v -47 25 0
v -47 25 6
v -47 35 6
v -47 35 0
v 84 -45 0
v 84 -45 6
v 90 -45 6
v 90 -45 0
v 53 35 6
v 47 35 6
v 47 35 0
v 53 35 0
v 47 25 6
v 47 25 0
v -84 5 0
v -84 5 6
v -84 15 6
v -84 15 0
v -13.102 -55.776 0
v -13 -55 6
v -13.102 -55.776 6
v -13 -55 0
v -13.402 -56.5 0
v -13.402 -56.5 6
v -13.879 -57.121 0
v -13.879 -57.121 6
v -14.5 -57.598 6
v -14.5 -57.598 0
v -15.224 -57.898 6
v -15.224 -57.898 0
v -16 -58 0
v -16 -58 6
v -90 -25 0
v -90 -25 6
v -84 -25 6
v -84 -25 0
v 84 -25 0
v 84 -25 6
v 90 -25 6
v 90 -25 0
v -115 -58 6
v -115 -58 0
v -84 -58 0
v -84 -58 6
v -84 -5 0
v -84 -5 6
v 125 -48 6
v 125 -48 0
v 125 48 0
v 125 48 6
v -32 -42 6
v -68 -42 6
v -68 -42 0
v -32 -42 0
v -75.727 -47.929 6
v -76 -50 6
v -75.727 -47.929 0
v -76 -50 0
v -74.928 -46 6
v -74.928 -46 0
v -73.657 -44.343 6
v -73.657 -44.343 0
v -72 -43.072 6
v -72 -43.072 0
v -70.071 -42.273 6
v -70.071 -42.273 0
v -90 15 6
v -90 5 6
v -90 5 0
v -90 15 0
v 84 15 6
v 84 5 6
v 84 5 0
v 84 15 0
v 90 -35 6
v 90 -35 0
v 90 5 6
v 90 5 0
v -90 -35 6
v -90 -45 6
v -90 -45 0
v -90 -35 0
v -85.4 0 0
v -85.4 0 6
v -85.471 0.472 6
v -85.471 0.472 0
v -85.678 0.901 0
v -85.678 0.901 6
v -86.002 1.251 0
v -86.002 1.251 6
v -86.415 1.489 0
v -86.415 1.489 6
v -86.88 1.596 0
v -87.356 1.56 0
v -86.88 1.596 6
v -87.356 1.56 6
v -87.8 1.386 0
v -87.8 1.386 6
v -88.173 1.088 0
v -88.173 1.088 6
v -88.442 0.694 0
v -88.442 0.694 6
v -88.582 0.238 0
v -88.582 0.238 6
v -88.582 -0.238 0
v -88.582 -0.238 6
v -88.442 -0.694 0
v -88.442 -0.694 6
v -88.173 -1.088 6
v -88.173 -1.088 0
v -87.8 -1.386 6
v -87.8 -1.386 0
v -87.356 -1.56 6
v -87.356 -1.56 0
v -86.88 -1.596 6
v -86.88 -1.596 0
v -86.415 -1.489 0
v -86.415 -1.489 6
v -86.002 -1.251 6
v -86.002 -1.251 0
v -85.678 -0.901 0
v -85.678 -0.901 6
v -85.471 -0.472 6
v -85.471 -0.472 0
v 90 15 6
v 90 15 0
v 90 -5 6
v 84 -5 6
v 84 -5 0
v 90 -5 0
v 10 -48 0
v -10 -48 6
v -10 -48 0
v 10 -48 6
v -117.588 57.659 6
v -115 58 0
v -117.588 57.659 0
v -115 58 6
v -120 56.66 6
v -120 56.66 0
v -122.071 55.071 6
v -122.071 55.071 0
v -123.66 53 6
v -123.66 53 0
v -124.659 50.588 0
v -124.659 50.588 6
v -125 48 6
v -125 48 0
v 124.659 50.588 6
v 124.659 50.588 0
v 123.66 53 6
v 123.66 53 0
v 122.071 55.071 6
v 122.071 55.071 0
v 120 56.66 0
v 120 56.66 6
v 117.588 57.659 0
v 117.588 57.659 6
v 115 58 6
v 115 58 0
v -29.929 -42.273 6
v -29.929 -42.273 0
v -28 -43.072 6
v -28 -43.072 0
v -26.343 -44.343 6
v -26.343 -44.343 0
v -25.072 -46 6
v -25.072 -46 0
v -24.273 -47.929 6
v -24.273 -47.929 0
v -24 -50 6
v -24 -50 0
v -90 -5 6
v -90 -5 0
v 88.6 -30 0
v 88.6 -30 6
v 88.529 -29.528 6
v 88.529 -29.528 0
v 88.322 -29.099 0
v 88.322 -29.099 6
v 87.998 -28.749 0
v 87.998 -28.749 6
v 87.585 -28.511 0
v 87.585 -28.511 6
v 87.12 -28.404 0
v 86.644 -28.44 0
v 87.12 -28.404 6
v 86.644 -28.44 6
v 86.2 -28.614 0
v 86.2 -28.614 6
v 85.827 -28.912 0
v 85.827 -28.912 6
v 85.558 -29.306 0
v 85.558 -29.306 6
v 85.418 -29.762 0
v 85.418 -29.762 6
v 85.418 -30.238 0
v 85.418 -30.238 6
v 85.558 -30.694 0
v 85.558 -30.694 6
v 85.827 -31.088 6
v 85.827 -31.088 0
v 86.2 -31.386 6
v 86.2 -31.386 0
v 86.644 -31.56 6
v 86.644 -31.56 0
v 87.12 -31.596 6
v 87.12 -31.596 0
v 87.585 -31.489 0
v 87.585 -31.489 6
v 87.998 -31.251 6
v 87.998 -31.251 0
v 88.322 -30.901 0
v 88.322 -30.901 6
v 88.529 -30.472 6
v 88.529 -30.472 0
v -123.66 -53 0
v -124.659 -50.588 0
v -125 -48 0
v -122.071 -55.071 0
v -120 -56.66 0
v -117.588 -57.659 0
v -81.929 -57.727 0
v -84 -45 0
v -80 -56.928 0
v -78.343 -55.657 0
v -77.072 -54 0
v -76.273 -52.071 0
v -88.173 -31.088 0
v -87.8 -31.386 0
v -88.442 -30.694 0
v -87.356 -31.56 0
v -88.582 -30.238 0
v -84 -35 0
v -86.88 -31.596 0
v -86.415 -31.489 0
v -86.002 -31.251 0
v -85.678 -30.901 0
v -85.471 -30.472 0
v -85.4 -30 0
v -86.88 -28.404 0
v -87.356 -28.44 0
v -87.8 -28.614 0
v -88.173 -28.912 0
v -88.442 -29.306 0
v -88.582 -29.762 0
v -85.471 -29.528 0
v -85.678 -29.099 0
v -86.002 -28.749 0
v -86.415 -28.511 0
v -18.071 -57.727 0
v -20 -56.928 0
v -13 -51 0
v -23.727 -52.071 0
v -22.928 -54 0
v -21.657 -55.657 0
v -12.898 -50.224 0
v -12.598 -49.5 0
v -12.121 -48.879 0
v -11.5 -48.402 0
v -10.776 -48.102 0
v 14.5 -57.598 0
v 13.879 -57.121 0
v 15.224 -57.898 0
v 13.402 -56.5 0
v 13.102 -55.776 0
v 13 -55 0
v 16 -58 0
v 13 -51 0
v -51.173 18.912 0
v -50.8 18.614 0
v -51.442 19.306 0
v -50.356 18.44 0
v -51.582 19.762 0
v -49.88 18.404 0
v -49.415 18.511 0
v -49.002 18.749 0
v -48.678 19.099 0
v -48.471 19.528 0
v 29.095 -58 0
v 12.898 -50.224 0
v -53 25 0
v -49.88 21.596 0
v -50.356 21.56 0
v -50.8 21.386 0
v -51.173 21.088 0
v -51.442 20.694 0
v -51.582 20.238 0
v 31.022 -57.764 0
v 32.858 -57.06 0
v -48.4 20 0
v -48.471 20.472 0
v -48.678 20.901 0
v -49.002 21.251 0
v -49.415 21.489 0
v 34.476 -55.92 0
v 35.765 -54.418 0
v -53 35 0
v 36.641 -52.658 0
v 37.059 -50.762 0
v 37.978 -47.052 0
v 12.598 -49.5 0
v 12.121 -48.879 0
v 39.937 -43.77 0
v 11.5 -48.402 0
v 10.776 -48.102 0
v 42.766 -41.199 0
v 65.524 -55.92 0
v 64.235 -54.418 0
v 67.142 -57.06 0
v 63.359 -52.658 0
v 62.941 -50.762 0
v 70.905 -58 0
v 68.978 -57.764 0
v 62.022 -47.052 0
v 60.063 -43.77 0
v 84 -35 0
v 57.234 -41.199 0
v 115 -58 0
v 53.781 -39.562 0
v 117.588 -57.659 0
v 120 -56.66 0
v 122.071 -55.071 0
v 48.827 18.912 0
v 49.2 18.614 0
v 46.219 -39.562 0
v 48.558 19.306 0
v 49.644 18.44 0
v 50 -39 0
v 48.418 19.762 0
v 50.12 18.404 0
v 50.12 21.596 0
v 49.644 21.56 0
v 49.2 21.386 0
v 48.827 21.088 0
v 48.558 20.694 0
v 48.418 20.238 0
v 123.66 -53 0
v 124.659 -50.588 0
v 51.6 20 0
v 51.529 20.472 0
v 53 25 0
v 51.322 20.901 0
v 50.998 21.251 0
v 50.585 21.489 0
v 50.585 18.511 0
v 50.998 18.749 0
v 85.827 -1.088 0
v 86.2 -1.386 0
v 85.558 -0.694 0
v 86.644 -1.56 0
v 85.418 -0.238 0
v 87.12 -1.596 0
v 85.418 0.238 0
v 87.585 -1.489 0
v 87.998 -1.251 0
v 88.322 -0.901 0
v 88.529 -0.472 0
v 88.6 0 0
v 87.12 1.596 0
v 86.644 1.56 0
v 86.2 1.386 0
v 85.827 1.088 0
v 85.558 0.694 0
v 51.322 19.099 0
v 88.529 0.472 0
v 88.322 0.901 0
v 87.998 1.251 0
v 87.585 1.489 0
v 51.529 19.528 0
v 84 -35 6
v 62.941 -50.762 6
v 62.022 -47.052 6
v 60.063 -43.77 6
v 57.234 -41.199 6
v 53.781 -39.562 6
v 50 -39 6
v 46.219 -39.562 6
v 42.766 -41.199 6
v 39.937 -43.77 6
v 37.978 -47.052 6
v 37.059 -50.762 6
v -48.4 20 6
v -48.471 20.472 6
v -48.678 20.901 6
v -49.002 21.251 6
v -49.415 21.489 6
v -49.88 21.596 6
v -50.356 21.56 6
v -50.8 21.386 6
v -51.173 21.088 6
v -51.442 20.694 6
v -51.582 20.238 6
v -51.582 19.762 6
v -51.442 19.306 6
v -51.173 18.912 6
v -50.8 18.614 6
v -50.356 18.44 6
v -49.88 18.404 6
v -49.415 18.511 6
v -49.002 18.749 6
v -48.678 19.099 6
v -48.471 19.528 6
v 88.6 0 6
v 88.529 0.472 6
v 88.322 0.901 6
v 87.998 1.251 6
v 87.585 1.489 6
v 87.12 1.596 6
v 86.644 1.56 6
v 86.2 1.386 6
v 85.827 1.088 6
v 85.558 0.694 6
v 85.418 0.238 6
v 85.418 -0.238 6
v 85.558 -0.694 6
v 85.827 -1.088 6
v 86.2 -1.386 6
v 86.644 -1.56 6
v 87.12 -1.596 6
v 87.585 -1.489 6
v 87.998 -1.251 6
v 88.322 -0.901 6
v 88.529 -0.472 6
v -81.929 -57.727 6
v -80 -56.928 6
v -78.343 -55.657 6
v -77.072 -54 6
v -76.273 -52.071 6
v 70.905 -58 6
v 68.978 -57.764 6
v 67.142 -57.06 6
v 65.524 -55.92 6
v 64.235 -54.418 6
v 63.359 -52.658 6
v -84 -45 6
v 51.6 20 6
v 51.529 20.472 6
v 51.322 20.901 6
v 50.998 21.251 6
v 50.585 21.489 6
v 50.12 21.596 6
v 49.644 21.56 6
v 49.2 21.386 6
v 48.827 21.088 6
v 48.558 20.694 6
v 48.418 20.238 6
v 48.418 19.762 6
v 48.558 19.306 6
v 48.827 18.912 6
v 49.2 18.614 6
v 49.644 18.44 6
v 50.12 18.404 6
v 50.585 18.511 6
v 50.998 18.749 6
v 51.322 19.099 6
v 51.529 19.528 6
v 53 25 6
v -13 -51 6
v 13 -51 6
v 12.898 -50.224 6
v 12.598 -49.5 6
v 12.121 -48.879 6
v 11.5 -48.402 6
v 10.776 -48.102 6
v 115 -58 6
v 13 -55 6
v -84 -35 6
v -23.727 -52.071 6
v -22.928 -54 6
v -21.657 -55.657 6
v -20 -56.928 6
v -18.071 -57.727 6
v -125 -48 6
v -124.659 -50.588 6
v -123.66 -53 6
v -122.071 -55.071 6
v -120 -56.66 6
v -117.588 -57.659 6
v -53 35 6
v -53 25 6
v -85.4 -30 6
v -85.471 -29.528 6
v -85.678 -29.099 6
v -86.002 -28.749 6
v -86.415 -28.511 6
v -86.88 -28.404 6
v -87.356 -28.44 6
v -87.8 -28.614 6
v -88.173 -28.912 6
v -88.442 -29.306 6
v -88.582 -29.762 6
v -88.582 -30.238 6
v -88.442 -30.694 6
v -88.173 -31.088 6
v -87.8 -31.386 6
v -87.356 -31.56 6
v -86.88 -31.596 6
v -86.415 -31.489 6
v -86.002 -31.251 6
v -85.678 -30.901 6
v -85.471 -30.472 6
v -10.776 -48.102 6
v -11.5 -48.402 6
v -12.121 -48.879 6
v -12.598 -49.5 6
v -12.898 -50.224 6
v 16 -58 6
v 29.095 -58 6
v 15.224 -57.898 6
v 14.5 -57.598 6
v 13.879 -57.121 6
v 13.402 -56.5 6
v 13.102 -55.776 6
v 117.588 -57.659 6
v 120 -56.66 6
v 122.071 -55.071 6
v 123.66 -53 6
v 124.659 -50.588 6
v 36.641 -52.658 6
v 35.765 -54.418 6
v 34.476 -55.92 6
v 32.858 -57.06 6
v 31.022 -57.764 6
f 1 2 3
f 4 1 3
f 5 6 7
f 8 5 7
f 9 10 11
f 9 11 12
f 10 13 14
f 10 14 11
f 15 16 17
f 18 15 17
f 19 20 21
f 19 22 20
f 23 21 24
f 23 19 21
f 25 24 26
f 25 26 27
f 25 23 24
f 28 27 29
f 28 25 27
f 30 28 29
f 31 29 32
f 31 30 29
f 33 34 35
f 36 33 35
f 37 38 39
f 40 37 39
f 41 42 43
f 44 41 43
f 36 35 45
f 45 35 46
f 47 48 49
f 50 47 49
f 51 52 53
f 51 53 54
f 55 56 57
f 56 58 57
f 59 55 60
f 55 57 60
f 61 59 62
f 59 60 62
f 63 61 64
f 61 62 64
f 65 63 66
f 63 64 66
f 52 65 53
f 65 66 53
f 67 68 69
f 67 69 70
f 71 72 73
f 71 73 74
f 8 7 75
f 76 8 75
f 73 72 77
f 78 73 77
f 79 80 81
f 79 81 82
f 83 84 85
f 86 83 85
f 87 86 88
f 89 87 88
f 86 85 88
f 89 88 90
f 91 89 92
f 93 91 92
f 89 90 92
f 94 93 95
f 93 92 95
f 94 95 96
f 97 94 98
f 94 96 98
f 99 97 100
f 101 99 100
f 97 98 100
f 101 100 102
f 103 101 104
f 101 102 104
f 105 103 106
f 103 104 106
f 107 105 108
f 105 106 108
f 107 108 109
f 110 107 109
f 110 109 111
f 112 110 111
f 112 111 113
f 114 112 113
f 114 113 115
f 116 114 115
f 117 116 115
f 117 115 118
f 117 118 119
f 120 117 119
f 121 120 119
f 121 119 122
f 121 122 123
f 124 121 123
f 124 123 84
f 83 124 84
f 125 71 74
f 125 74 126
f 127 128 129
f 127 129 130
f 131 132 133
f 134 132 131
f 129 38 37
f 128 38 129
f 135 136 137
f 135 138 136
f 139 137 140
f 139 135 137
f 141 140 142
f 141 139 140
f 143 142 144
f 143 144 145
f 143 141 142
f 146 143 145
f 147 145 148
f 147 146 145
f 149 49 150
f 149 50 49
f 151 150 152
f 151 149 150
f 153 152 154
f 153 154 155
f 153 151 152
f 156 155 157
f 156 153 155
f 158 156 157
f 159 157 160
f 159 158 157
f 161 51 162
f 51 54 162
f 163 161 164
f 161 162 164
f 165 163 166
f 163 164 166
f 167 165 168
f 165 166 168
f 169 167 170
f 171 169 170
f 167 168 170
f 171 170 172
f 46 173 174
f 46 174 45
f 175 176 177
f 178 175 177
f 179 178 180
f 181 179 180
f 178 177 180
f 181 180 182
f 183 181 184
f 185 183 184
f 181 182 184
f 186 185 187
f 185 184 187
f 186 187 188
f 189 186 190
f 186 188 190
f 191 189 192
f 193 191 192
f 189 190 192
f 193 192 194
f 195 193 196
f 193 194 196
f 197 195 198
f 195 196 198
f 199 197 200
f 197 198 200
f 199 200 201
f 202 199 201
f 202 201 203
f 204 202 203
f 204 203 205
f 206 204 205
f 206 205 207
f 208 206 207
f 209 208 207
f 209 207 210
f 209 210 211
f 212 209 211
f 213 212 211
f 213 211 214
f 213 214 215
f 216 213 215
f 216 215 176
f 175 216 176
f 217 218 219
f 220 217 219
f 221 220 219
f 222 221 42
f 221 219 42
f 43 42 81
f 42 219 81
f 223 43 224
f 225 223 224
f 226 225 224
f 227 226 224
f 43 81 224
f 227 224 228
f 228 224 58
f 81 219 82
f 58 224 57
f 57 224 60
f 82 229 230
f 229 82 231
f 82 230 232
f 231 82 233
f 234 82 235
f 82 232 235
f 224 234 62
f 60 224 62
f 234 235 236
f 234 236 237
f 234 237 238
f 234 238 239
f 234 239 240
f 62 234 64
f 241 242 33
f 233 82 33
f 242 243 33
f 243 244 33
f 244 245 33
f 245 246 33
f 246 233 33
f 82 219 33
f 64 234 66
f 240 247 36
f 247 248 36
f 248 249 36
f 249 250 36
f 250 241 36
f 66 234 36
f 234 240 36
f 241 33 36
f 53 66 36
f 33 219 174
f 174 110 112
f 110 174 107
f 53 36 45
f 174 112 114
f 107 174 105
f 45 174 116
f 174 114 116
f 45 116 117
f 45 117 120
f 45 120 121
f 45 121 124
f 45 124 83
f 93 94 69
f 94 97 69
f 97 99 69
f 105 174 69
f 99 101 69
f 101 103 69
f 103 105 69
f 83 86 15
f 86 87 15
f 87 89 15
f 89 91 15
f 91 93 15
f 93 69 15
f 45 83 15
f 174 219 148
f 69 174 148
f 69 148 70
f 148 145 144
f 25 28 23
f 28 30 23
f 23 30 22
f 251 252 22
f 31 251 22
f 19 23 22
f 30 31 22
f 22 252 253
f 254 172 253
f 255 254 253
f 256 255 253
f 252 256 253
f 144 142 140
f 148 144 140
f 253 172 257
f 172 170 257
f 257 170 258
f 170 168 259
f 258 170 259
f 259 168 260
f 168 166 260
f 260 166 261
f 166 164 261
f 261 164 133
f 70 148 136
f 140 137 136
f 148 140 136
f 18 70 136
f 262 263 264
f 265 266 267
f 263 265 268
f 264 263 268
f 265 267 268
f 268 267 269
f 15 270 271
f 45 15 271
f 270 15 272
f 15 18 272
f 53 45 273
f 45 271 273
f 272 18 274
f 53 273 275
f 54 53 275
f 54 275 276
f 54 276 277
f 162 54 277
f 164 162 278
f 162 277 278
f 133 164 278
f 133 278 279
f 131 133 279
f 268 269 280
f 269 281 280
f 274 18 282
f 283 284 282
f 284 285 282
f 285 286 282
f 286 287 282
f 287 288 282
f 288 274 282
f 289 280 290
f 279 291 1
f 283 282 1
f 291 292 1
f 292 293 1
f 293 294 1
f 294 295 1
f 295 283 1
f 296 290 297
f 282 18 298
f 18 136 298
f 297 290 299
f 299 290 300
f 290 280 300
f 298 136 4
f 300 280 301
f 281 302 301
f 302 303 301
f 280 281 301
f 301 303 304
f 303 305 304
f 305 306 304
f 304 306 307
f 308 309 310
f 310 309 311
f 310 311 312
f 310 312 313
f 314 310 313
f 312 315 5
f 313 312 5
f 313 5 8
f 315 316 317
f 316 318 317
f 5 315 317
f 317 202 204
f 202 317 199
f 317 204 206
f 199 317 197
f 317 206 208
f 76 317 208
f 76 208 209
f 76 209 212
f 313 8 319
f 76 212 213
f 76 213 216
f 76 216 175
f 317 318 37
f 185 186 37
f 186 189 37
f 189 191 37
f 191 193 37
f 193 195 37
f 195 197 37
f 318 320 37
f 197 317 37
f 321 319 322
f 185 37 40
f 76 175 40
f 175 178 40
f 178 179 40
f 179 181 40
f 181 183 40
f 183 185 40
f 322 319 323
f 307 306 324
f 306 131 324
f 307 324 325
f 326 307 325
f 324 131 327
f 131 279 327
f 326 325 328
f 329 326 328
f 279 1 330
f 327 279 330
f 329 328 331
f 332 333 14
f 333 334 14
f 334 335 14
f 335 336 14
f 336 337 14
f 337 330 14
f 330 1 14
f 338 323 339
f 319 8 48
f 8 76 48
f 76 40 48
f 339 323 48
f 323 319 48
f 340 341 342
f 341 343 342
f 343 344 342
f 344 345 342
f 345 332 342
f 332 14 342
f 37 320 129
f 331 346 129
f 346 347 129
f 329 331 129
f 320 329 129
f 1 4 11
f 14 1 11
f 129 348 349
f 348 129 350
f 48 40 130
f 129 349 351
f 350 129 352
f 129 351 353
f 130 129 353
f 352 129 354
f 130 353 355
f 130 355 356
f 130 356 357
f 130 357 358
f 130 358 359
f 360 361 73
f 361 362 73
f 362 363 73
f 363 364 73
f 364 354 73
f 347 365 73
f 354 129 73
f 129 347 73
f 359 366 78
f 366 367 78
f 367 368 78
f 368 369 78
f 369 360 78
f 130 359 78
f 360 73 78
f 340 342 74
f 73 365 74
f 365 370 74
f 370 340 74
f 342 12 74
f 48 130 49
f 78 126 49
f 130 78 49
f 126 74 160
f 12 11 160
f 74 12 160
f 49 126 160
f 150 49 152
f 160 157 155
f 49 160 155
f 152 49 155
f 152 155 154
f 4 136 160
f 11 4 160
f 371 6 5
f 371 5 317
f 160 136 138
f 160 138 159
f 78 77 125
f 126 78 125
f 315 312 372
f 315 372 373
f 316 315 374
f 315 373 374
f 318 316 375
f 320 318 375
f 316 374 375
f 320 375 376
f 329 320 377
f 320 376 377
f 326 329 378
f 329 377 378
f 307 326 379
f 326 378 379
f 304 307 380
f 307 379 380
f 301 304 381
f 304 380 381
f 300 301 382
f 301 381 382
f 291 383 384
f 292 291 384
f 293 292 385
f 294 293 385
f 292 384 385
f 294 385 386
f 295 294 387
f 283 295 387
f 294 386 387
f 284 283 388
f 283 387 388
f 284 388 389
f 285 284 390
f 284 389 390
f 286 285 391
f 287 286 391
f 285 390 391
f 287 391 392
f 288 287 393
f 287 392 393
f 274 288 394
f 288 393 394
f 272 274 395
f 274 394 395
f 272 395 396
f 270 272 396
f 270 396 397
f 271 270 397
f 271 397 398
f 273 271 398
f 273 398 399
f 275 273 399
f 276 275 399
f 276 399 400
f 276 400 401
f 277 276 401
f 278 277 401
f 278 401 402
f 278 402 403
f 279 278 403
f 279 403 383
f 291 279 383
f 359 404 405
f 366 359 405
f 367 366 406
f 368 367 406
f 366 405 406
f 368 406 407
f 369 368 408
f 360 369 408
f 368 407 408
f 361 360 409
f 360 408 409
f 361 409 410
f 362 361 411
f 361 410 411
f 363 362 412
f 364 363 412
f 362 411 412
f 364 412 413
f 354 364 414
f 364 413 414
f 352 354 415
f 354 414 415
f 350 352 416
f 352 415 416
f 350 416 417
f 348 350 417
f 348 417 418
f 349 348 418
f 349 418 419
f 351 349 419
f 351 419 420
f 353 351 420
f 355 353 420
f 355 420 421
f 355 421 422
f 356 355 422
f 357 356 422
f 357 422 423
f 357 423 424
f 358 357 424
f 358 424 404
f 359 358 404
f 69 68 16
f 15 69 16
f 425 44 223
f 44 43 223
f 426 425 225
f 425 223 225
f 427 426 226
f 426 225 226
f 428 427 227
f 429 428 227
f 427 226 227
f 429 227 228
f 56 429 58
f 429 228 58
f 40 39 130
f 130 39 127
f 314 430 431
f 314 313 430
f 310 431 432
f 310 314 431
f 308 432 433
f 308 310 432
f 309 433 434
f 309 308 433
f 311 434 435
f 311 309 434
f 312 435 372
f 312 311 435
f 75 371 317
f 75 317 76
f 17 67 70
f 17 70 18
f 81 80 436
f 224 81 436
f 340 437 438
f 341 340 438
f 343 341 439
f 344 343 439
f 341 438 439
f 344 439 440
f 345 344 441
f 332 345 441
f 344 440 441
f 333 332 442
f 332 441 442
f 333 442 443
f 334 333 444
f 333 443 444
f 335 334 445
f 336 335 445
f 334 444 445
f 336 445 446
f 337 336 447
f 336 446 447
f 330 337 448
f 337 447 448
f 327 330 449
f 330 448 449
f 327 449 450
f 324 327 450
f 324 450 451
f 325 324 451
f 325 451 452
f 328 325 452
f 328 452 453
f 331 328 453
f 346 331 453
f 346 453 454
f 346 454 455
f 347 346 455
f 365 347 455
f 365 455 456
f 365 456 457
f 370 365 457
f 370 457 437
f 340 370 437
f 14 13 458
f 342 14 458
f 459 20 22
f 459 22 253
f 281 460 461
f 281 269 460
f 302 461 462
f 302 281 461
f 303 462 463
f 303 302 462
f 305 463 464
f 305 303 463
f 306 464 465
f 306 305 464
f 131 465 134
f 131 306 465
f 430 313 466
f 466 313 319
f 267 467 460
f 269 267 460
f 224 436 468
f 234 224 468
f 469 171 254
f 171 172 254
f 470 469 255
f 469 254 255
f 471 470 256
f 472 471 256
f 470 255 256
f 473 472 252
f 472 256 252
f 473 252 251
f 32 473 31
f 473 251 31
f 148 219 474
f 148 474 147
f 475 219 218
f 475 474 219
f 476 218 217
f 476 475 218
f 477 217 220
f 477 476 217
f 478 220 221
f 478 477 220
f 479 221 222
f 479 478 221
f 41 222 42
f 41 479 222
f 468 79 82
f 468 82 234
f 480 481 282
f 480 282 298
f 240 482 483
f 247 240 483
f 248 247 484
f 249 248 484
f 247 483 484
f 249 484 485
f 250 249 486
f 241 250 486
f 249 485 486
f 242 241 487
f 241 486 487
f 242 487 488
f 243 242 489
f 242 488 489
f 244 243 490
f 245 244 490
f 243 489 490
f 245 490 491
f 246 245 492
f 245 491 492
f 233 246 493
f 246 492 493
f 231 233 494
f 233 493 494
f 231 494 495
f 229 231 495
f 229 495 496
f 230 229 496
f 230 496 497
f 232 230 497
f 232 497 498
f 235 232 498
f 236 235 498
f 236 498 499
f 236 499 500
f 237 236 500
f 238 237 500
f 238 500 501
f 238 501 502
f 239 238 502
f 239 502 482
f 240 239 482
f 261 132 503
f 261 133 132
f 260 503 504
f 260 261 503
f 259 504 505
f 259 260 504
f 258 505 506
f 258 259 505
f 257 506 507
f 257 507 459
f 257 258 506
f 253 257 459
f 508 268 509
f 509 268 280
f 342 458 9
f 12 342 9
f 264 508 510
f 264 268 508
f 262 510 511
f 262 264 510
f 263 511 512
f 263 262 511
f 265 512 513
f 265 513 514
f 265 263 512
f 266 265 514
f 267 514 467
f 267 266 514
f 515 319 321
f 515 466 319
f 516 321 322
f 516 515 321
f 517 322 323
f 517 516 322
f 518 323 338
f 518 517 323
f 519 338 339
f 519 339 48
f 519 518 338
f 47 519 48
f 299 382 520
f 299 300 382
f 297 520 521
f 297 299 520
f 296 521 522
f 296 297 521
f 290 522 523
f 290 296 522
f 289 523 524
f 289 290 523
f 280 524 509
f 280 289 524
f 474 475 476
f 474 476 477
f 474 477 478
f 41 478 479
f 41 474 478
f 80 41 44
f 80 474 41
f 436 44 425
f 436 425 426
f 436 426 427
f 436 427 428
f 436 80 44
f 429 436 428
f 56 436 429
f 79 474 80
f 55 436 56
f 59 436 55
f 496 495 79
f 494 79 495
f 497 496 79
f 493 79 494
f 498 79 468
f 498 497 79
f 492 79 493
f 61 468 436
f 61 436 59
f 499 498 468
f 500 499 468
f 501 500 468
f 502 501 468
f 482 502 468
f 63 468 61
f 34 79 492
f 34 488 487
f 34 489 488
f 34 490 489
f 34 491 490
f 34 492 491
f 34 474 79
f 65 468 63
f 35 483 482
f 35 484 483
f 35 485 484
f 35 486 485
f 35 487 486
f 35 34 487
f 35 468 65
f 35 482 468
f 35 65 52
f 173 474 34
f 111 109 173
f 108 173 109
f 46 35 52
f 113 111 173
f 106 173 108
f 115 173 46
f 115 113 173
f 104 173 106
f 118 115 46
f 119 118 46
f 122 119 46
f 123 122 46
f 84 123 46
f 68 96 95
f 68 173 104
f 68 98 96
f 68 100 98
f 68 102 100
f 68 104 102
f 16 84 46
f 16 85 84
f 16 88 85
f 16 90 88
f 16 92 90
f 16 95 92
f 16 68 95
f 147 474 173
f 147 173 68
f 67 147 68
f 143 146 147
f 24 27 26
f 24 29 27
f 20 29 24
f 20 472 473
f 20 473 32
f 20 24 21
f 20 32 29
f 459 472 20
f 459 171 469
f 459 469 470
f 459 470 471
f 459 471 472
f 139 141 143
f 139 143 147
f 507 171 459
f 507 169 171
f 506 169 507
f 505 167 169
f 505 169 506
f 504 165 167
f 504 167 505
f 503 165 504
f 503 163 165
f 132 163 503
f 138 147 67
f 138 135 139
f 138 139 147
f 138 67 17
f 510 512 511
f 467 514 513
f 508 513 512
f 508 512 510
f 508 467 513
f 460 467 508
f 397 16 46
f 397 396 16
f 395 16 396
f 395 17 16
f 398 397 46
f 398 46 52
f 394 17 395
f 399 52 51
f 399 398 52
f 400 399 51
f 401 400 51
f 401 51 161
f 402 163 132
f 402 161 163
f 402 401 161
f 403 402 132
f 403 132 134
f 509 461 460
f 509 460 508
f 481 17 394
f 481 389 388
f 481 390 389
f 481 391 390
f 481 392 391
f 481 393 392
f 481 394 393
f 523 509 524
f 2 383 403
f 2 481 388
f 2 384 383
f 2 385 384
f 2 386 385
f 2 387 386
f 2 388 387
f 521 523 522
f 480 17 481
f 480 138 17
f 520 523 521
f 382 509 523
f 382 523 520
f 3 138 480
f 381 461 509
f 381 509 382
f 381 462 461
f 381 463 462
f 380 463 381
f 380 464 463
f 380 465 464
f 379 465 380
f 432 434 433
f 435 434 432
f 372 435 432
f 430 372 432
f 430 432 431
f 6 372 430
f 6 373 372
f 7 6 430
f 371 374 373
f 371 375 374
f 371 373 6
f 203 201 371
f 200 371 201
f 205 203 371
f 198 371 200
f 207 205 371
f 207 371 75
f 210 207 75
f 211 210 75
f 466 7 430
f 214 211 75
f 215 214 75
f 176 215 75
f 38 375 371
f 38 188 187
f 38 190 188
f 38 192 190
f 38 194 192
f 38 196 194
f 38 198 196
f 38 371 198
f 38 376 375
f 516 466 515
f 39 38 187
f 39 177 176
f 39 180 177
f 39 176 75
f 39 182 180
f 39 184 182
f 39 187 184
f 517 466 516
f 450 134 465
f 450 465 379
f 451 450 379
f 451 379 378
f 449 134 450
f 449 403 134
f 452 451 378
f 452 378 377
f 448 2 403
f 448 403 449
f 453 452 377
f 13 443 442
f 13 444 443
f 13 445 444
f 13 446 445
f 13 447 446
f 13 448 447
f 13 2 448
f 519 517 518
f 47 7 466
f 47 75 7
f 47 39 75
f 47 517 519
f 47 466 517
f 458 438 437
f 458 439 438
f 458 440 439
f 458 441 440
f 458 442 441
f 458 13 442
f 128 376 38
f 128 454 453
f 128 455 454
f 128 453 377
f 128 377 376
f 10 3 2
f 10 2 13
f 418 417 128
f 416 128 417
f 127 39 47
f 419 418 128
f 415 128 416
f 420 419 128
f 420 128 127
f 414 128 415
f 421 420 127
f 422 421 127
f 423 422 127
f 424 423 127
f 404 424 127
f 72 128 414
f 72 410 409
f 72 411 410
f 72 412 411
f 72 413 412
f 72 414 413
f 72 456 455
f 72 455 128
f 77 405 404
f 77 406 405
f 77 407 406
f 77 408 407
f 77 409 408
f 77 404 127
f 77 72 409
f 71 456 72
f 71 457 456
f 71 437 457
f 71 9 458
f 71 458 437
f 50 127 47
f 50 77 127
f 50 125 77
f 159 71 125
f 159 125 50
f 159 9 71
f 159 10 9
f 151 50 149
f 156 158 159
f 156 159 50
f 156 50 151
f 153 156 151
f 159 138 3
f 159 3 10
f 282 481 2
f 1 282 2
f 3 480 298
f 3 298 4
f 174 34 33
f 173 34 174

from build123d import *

# Parameters (mm, degrees)
F0_W     = 250
F0_H     = 116
F1_DEPTH = 6
F2_W     = 6
F2_H     = 10
F2_H_2   = 20
F2_W_2   = 26
F2_R     = 1.6
F2_W_3   = 52
F2_H_3   = 16
F3_DEPTH = 6.001
F4_R     = 3
F5_R     = 10
F6_R     = 7.99999
F7_R     = 1.6
F7_W     = 6
F7_H     = 10
F8_DEPTH = 6.0010001


# Not quite as in the source:
# - a fillet or chamfer is up to 0.001 mm smaller than in the source, because OpenCascade refuses the exact size


with BuildPart() as f1:
    # F0 (on Top) → F1 (new body)
    with BuildSketch(Plane.XY):
        Rectangle(F0_W, F0_H)
    extrude(amount=F1_DEPTH)

    # F2 (on face) → F3 (cut, through all)
    with BuildSketch(Plane.XY.offset(6)):
        with Locations((-87, -40)):
            Rectangle(F2_W, F2_H)
        with Locations((-87, 10)):
            Rectangle(F2_W, F2_H)
        with Locations((87, -40)):
            Rectangle(F2_W, F2_H)
        with Locations((87, 10)):
            Rectangle(F2_W, F2_H)
        with Locations((-87, -15)):
            Rectangle(F2_W, F2_H_2)
        with Locations((87, -15)):
            Rectangle(F2_W, F2_H_2)
        with Locations((0, -53)):
            Rectangle(F2_W_2, F2_H)
        with Locations((-87, -30)):
            Circle(F2_R)
        with Locations((-87, 0)):
            Circle(F2_R)
        with Locations((87, -30)):
            Circle(F2_R)
        with Locations((87, 0)):
            Circle(F2_R)
        with BuildLine():
            Line((37, -58), (63, -58))
            Line((63, -58), (63, -52))
            ThreePointArc((63, -52), (50, -39), (37, -52))
            Line((37, -52), (37, -58))
        make_face()
        with Locations((-50, -50)):
            Rectangle(F2_W_3, F2_H_3)
    extrude(amount=-F3_DEPTH, mode=Mode.SUBTRACT)

    # F4
    f4_edges = [f1.edges().sort_by_distance(p)[0] for p in [
        (-13, -48, 3),
        (13, -48, 3),
        (-13, -58, 3),
        (13, -58, 3),
    ]]
    fillet(f4_edges, radius=F4_R)

    # F5
    f5_edges = [f1.edges().sort_by_distance(p)[0] for p in [
        (-125, -58, 3),
        (125, -58, 3),
        (125, 58, 3),
        (-125, 58, 3),
    ]]
    fillet(f5_edges, radius=F5_R)

    # F6 (radius 8 in the source; OpenCascade refuses exactly that, so slightly less here)
    f6_edges = [f1.edges().sort_by_distance(p)[0] for p in [
        (37, -58, 3),
        (63, -58, 3),
        (-24, -58, 3),
        (-24, -42, 3),
        (-76, -42, 3),
        (-76, -58, 3),
    ]]
    fillet(f6_edges, radius=F6_R)

    # F7 (on face) → F8 (cut, through all)
    with BuildSketch(Plane.XY.offset(6)):
        with Locations((-50, 20)):
            Circle(F7_R)
        with Locations((-50, 30)):
            Rectangle(F7_W, F7_H)
        with Locations((50, 30)):
            Rectangle(F7_W, F7_H)
        with Locations((50, 20)):
            Circle(F7_R)
    extrude(amount=-F8_DEPTH, mode=Mode.SUBTRACT)


solid = f1.part
